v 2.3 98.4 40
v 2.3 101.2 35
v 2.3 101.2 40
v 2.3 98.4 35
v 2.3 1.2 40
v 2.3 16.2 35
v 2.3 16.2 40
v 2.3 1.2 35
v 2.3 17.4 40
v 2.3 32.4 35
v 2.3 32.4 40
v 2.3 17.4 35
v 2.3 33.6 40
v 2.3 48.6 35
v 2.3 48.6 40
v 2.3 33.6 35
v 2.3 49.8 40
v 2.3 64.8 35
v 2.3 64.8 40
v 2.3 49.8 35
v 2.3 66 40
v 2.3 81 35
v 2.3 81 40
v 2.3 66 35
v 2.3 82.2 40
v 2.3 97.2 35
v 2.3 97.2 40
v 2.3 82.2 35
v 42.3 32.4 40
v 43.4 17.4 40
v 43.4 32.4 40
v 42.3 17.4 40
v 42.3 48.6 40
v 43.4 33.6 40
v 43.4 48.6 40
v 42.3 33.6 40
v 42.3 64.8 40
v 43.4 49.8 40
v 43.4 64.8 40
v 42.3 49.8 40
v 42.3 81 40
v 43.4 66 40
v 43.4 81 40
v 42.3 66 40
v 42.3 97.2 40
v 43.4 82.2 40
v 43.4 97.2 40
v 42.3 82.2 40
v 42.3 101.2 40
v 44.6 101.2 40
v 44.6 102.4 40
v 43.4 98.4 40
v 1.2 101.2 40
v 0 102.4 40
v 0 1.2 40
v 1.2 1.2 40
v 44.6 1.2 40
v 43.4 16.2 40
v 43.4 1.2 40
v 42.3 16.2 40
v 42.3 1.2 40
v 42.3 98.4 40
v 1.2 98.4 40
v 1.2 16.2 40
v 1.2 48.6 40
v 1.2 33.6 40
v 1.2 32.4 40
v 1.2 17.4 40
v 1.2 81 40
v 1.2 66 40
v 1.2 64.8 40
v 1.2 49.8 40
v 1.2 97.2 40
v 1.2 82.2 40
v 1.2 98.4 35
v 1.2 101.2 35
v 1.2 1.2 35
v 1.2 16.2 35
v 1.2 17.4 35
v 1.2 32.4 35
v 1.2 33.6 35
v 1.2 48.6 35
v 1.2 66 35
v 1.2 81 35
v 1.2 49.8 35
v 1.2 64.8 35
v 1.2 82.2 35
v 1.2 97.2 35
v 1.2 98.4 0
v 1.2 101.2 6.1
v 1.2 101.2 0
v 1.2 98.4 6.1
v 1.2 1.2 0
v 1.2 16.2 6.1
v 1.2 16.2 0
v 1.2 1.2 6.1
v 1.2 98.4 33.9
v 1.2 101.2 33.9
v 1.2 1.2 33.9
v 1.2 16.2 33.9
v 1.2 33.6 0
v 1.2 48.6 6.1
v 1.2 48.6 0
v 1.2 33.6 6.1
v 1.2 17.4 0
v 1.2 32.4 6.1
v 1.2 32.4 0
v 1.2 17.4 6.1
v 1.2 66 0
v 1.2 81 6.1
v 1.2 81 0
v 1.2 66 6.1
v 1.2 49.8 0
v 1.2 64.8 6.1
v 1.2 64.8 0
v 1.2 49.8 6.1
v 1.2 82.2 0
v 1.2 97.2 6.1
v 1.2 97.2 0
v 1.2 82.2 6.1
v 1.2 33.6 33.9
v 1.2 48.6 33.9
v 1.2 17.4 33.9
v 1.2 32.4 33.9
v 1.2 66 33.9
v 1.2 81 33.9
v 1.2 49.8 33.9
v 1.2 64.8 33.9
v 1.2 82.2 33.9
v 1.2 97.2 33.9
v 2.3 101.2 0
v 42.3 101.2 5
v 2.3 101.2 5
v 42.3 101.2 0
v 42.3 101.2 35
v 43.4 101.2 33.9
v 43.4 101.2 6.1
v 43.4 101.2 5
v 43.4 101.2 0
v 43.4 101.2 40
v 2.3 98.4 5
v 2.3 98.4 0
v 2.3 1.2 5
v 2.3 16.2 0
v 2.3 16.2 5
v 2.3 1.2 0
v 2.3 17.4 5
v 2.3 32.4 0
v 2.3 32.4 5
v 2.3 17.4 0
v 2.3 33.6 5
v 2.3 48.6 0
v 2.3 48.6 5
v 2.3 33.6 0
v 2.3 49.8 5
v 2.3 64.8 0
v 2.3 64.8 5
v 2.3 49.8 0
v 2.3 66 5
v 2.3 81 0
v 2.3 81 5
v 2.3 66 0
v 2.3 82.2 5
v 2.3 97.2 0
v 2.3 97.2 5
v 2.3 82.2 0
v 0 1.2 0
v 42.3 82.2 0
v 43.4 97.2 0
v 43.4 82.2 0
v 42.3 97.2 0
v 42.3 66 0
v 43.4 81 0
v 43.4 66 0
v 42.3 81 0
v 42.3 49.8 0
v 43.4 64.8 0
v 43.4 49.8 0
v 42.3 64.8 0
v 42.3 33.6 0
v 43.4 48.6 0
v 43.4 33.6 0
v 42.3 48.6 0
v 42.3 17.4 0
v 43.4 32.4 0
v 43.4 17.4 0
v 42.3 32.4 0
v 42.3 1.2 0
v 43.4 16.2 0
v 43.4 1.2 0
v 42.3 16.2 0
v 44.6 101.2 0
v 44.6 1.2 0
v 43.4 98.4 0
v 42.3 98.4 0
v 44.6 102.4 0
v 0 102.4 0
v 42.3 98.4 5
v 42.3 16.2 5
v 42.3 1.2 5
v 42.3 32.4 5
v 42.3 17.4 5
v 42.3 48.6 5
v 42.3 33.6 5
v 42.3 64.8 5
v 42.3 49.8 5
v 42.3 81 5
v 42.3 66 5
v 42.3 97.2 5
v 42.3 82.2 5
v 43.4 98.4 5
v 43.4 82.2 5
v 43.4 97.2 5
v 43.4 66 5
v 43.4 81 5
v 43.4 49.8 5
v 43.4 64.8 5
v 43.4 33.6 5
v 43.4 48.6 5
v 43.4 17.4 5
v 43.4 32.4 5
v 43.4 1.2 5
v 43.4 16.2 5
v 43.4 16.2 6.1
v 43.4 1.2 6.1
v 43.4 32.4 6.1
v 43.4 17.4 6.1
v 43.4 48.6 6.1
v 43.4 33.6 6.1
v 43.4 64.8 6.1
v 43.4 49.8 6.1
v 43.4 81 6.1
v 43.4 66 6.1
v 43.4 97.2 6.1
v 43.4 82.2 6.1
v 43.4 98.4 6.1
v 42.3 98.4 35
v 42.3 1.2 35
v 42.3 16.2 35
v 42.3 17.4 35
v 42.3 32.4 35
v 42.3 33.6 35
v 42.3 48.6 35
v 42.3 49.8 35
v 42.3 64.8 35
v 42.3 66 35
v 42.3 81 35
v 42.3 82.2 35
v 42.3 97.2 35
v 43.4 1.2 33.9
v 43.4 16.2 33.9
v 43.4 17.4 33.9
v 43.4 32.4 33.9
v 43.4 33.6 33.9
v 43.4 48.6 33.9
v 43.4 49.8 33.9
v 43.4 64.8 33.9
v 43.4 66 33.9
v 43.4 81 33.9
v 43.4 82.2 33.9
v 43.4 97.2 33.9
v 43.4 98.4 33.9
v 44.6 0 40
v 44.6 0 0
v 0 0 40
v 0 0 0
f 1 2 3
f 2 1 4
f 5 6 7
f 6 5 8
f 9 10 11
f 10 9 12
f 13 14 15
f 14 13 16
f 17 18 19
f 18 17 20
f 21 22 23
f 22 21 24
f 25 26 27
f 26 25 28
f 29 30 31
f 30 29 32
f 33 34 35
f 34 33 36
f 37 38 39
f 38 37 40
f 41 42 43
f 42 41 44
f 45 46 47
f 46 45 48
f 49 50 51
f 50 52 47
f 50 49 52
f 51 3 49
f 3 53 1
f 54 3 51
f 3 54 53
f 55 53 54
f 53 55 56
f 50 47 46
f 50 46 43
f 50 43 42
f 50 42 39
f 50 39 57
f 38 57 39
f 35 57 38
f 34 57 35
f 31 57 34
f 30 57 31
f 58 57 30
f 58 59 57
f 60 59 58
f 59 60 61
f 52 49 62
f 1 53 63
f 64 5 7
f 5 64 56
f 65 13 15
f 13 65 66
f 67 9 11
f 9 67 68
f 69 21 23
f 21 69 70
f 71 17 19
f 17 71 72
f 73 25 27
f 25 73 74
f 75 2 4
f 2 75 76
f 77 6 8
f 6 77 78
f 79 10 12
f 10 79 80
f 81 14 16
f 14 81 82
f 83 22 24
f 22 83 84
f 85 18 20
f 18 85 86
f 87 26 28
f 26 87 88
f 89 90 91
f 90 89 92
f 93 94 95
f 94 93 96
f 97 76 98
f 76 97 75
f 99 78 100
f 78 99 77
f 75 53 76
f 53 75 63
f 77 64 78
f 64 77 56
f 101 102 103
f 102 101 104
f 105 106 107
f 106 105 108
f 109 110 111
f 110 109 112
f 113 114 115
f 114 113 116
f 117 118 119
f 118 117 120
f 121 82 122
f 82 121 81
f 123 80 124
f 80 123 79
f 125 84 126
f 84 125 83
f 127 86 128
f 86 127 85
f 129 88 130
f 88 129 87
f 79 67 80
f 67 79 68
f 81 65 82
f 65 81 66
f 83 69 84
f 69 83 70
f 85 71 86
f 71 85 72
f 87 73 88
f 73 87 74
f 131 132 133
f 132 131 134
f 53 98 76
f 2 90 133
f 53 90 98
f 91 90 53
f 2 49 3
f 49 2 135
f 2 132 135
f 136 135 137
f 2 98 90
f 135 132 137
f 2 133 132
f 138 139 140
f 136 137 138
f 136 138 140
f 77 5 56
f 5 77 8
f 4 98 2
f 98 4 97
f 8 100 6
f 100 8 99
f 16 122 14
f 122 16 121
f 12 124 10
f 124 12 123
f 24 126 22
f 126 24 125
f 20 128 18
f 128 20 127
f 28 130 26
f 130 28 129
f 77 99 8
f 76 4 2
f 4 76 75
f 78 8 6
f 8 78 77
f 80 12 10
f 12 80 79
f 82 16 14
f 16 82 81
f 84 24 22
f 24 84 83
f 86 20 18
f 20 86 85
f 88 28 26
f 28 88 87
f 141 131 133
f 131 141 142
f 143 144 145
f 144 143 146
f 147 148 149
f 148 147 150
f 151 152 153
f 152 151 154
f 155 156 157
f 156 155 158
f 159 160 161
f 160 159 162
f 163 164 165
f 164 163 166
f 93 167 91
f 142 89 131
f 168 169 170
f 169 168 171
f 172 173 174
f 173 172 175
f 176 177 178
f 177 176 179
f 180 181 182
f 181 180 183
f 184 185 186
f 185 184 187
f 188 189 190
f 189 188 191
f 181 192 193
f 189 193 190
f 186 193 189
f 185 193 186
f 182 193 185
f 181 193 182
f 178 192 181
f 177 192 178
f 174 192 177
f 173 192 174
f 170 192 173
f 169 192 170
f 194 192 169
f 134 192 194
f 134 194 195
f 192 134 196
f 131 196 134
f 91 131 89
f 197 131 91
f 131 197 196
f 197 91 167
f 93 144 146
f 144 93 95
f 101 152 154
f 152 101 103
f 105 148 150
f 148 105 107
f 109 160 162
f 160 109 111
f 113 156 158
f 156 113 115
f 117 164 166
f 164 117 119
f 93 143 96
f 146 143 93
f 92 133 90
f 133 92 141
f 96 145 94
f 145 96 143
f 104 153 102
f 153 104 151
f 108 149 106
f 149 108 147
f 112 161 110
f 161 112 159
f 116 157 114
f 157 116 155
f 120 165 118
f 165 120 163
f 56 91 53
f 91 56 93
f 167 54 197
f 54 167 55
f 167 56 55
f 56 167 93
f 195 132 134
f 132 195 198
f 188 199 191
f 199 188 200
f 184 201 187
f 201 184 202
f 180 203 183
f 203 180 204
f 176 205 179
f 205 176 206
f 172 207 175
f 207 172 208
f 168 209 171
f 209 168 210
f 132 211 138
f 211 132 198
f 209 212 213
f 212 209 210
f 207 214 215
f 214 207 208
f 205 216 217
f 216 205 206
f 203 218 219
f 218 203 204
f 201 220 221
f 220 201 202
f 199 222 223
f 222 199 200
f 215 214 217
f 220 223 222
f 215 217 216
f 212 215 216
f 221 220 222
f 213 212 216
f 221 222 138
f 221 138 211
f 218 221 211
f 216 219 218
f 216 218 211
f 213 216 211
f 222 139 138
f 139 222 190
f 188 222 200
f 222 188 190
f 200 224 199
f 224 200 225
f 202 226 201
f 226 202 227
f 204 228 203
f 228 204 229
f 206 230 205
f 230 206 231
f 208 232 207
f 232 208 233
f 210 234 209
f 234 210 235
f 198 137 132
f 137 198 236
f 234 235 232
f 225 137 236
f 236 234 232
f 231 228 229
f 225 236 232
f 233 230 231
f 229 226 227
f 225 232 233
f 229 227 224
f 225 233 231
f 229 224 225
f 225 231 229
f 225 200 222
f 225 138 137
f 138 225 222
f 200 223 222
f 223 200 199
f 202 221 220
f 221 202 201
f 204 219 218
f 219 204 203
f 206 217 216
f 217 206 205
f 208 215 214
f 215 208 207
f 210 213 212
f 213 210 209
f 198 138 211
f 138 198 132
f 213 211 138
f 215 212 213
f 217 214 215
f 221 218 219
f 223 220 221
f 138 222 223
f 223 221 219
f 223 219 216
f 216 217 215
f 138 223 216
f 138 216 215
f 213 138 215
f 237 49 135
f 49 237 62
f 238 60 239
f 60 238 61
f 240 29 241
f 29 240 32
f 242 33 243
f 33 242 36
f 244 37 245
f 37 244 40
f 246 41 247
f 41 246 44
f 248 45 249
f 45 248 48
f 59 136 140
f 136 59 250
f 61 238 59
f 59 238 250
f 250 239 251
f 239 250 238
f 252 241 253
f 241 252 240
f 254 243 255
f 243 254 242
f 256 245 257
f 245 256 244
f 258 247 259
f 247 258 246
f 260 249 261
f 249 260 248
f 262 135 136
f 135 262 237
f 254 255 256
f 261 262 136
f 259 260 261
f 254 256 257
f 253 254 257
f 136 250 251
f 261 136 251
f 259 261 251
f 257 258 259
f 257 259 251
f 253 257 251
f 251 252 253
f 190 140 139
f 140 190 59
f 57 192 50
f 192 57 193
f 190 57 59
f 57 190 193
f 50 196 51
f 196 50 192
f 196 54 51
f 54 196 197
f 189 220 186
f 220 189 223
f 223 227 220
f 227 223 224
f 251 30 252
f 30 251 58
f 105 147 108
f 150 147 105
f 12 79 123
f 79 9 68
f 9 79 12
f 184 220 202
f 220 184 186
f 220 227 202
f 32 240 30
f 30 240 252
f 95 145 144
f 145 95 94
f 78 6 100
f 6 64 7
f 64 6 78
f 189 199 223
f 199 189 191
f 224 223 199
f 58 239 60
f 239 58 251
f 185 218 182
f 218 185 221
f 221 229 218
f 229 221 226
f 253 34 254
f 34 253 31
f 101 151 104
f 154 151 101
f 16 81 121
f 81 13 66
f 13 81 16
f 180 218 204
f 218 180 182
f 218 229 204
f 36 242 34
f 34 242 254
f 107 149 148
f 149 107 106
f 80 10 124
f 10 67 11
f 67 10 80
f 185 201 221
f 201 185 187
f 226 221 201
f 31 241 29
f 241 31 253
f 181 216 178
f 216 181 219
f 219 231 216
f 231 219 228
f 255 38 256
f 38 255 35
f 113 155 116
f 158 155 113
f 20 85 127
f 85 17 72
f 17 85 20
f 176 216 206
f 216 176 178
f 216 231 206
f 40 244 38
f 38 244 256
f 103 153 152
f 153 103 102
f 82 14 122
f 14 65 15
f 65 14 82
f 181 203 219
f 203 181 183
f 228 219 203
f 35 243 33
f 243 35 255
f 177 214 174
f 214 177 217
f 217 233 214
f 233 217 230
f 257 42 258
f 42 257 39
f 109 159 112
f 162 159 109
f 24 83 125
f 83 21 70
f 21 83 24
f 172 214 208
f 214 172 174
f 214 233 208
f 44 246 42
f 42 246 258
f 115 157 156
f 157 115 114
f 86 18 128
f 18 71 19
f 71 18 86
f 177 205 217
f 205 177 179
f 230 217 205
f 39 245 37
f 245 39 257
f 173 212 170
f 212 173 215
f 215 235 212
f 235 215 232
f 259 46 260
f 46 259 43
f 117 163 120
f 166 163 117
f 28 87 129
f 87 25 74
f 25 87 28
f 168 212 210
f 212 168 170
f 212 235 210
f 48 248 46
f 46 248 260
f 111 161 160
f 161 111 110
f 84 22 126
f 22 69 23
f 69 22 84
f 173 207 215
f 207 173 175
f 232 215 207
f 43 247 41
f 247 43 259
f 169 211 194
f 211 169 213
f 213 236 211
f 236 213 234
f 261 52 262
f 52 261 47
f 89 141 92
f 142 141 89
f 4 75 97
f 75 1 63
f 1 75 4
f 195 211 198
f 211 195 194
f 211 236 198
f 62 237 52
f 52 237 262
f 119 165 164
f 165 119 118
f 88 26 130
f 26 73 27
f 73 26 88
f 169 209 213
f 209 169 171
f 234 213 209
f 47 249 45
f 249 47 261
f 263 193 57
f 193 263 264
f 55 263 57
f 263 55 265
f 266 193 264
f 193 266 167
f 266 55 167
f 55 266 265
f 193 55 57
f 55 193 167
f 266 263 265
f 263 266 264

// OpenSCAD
// file: Primitives.scad
module triangular_profile(width, height, depth, points=[[0.5, 0.5],[1, 0], [0, 0]]){
  translate([0, depth, 0]) {
    rotate(90, [1, 0, 0]) {
      linear_extrude(height=depth) {
        polygon(
          points=[
            [width * points[0][0], height * points[0][1]], // top
            [width * points[1][0], height * points[1][1]], // right
            [width * points[2][0], height * points[2][1]] // left
          ], 
          paths=[[0,1,2]]
        );
      }
    }
  }
}
// main file
use <Primitives.scad>

DividerHoleHeight = 3;
DividerHoleDepth = 4;
DividerDistance = 5;
WallThickness = 6;
Tolerance = 7;
function createCompartmentWithDividersProperties(width, depth, height, divider_hole_height, divider_hole_depth, divider_distance, wall_thickness = 1, tolerance = 0.1) = [width, depth, height, divider_hole_height, divider_hole_depth, divider_distance, wall_thickness, tolerance];
function compartmentWithDividersWallThickness(properties) = (properties[WallThickness] + properties[DividerHoleDepth] + properties[Tolerance]);
function compartmentWithDividersDividerWidth(properties) = properties.x + properties[DividerHoleDepth] * 2;
function compartmentWithDividersNegativeWidth(properties) = compartmentWithDividersDividerWidth(properties) + properties[Tolerance] * 2;
function compartmentWithDividersWidth(properties) = properties.x + compartmentWithDividersWallThickness(properties) * 2;

module compartment_with_dividers_wall(properties) {
  cube(size=[properties[WallThickness], properties.y, properties.z]);
  translate([properties[WallThickness], 0, 0]) {
    holeWidth = properties[DividerHoleDepth] + properties[Tolerance];
    cube(size=[holeWidth, properties.y, properties[DividerHoleHeight]]);
    translate([0, 0, properties[DividerHoleHeight]]) {
      triangular_profile(holeWidth, holeWidth, properties.y, points=[[0, 0],[0, 1], [1, 0]]);
    }

    translate([0, 0, properties.z - properties[DividerHoleHeight]]) {
      cube(size=[holeWidth, properties.y, properties[DividerHoleHeight]]);

      translate([0, 0, -holeWidth]) {
        triangular_profile(holeWidth, holeWidth, properties.y, points=[[0, 0],[0, 1], [1, 1]]);
      }
    }
  }
}


module compartment_divider(properties) {
  cube(size=[compartmentWithDividersDividerWidth(properties), properties[WallThickness], properties.z]);
}

module compartment_end(properties) {
  cube(size=[compartmentWithDividersWidth(properties), properties[WallThickness], properties.z]);
}

module compartment_with_dividers(properties) {
  compartment_end(properties);

  difference() {
    compartmentWallThickness = compartmentWithDividersWallThickness(properties);
    
    union() {
      translate([0, properties[WallThickness], 0]) {
        compartment_with_dividers_wall(properties);
    
        translate([compartmentWallThickness + properties.x, 0, properties.z]) {
          translate([compartmentWithDividersWallThickness(properties), 0, 0]) {
            rotate(180, [0, 1, 0]) {
              compartment_with_dividers_wall(properties);
            }
          }
        }
      
        translate([0, properties.y, 0]) {
          compartment_end(properties);
        }
      }
    }

    negativeProperties = createCompartmentWithDividersProperties(
      width = properties.x + properties[Tolerance] * 2,
      depth = properties.y + properties[Tolerance] * 2,
      height = properties.z + properties[Tolerance] * 2,
      divider_hole_height = properties[DividerHoleHeight],
      divider_hole_depth = properties[DividerHoleDepth],
      divider_distance = properties[DividerDistance],
      wall_thickness = properties[WallThickness],
      tolerance = properties[Tolerance]
    );
  
    translate([0, properties[WallThickness], 0]) {
      divider_count = floor(properties.y / (properties[DividerDistance] + properties[WallThickness]));
    
      translate([properties[WallThickness], properties[DividerDistance], -properties[Tolerance]]) {
        for(y=[0:1:divider_count-1]) {
          translate([0, (properties[DividerDistance] + properties[WallThickness]) * y, 0]) {
            compartment_divider(negativeProperties);
          }
        }
      }
    }  
  }
}

properties = createCompartmentWithDividersProperties(
  width = 40,
  depth = 100,
  height = 40,
  divider_hole_height = 5,
  divider_hole_depth = 1,
  divider_distance = 15,
  wall_thickness = 1.2,
  tolerance = 0.1
);

renderCompartment = true;
renderDivider = false;

if (renderCompartment) {
  compartment_with_dividers(properties);
}

if (renderDivider) {
  translate([properties[WallThickness] + properties[Tolerance], properties[DividerDistance], properties.z]) {
    compartment_divider(properties);
  }
}
